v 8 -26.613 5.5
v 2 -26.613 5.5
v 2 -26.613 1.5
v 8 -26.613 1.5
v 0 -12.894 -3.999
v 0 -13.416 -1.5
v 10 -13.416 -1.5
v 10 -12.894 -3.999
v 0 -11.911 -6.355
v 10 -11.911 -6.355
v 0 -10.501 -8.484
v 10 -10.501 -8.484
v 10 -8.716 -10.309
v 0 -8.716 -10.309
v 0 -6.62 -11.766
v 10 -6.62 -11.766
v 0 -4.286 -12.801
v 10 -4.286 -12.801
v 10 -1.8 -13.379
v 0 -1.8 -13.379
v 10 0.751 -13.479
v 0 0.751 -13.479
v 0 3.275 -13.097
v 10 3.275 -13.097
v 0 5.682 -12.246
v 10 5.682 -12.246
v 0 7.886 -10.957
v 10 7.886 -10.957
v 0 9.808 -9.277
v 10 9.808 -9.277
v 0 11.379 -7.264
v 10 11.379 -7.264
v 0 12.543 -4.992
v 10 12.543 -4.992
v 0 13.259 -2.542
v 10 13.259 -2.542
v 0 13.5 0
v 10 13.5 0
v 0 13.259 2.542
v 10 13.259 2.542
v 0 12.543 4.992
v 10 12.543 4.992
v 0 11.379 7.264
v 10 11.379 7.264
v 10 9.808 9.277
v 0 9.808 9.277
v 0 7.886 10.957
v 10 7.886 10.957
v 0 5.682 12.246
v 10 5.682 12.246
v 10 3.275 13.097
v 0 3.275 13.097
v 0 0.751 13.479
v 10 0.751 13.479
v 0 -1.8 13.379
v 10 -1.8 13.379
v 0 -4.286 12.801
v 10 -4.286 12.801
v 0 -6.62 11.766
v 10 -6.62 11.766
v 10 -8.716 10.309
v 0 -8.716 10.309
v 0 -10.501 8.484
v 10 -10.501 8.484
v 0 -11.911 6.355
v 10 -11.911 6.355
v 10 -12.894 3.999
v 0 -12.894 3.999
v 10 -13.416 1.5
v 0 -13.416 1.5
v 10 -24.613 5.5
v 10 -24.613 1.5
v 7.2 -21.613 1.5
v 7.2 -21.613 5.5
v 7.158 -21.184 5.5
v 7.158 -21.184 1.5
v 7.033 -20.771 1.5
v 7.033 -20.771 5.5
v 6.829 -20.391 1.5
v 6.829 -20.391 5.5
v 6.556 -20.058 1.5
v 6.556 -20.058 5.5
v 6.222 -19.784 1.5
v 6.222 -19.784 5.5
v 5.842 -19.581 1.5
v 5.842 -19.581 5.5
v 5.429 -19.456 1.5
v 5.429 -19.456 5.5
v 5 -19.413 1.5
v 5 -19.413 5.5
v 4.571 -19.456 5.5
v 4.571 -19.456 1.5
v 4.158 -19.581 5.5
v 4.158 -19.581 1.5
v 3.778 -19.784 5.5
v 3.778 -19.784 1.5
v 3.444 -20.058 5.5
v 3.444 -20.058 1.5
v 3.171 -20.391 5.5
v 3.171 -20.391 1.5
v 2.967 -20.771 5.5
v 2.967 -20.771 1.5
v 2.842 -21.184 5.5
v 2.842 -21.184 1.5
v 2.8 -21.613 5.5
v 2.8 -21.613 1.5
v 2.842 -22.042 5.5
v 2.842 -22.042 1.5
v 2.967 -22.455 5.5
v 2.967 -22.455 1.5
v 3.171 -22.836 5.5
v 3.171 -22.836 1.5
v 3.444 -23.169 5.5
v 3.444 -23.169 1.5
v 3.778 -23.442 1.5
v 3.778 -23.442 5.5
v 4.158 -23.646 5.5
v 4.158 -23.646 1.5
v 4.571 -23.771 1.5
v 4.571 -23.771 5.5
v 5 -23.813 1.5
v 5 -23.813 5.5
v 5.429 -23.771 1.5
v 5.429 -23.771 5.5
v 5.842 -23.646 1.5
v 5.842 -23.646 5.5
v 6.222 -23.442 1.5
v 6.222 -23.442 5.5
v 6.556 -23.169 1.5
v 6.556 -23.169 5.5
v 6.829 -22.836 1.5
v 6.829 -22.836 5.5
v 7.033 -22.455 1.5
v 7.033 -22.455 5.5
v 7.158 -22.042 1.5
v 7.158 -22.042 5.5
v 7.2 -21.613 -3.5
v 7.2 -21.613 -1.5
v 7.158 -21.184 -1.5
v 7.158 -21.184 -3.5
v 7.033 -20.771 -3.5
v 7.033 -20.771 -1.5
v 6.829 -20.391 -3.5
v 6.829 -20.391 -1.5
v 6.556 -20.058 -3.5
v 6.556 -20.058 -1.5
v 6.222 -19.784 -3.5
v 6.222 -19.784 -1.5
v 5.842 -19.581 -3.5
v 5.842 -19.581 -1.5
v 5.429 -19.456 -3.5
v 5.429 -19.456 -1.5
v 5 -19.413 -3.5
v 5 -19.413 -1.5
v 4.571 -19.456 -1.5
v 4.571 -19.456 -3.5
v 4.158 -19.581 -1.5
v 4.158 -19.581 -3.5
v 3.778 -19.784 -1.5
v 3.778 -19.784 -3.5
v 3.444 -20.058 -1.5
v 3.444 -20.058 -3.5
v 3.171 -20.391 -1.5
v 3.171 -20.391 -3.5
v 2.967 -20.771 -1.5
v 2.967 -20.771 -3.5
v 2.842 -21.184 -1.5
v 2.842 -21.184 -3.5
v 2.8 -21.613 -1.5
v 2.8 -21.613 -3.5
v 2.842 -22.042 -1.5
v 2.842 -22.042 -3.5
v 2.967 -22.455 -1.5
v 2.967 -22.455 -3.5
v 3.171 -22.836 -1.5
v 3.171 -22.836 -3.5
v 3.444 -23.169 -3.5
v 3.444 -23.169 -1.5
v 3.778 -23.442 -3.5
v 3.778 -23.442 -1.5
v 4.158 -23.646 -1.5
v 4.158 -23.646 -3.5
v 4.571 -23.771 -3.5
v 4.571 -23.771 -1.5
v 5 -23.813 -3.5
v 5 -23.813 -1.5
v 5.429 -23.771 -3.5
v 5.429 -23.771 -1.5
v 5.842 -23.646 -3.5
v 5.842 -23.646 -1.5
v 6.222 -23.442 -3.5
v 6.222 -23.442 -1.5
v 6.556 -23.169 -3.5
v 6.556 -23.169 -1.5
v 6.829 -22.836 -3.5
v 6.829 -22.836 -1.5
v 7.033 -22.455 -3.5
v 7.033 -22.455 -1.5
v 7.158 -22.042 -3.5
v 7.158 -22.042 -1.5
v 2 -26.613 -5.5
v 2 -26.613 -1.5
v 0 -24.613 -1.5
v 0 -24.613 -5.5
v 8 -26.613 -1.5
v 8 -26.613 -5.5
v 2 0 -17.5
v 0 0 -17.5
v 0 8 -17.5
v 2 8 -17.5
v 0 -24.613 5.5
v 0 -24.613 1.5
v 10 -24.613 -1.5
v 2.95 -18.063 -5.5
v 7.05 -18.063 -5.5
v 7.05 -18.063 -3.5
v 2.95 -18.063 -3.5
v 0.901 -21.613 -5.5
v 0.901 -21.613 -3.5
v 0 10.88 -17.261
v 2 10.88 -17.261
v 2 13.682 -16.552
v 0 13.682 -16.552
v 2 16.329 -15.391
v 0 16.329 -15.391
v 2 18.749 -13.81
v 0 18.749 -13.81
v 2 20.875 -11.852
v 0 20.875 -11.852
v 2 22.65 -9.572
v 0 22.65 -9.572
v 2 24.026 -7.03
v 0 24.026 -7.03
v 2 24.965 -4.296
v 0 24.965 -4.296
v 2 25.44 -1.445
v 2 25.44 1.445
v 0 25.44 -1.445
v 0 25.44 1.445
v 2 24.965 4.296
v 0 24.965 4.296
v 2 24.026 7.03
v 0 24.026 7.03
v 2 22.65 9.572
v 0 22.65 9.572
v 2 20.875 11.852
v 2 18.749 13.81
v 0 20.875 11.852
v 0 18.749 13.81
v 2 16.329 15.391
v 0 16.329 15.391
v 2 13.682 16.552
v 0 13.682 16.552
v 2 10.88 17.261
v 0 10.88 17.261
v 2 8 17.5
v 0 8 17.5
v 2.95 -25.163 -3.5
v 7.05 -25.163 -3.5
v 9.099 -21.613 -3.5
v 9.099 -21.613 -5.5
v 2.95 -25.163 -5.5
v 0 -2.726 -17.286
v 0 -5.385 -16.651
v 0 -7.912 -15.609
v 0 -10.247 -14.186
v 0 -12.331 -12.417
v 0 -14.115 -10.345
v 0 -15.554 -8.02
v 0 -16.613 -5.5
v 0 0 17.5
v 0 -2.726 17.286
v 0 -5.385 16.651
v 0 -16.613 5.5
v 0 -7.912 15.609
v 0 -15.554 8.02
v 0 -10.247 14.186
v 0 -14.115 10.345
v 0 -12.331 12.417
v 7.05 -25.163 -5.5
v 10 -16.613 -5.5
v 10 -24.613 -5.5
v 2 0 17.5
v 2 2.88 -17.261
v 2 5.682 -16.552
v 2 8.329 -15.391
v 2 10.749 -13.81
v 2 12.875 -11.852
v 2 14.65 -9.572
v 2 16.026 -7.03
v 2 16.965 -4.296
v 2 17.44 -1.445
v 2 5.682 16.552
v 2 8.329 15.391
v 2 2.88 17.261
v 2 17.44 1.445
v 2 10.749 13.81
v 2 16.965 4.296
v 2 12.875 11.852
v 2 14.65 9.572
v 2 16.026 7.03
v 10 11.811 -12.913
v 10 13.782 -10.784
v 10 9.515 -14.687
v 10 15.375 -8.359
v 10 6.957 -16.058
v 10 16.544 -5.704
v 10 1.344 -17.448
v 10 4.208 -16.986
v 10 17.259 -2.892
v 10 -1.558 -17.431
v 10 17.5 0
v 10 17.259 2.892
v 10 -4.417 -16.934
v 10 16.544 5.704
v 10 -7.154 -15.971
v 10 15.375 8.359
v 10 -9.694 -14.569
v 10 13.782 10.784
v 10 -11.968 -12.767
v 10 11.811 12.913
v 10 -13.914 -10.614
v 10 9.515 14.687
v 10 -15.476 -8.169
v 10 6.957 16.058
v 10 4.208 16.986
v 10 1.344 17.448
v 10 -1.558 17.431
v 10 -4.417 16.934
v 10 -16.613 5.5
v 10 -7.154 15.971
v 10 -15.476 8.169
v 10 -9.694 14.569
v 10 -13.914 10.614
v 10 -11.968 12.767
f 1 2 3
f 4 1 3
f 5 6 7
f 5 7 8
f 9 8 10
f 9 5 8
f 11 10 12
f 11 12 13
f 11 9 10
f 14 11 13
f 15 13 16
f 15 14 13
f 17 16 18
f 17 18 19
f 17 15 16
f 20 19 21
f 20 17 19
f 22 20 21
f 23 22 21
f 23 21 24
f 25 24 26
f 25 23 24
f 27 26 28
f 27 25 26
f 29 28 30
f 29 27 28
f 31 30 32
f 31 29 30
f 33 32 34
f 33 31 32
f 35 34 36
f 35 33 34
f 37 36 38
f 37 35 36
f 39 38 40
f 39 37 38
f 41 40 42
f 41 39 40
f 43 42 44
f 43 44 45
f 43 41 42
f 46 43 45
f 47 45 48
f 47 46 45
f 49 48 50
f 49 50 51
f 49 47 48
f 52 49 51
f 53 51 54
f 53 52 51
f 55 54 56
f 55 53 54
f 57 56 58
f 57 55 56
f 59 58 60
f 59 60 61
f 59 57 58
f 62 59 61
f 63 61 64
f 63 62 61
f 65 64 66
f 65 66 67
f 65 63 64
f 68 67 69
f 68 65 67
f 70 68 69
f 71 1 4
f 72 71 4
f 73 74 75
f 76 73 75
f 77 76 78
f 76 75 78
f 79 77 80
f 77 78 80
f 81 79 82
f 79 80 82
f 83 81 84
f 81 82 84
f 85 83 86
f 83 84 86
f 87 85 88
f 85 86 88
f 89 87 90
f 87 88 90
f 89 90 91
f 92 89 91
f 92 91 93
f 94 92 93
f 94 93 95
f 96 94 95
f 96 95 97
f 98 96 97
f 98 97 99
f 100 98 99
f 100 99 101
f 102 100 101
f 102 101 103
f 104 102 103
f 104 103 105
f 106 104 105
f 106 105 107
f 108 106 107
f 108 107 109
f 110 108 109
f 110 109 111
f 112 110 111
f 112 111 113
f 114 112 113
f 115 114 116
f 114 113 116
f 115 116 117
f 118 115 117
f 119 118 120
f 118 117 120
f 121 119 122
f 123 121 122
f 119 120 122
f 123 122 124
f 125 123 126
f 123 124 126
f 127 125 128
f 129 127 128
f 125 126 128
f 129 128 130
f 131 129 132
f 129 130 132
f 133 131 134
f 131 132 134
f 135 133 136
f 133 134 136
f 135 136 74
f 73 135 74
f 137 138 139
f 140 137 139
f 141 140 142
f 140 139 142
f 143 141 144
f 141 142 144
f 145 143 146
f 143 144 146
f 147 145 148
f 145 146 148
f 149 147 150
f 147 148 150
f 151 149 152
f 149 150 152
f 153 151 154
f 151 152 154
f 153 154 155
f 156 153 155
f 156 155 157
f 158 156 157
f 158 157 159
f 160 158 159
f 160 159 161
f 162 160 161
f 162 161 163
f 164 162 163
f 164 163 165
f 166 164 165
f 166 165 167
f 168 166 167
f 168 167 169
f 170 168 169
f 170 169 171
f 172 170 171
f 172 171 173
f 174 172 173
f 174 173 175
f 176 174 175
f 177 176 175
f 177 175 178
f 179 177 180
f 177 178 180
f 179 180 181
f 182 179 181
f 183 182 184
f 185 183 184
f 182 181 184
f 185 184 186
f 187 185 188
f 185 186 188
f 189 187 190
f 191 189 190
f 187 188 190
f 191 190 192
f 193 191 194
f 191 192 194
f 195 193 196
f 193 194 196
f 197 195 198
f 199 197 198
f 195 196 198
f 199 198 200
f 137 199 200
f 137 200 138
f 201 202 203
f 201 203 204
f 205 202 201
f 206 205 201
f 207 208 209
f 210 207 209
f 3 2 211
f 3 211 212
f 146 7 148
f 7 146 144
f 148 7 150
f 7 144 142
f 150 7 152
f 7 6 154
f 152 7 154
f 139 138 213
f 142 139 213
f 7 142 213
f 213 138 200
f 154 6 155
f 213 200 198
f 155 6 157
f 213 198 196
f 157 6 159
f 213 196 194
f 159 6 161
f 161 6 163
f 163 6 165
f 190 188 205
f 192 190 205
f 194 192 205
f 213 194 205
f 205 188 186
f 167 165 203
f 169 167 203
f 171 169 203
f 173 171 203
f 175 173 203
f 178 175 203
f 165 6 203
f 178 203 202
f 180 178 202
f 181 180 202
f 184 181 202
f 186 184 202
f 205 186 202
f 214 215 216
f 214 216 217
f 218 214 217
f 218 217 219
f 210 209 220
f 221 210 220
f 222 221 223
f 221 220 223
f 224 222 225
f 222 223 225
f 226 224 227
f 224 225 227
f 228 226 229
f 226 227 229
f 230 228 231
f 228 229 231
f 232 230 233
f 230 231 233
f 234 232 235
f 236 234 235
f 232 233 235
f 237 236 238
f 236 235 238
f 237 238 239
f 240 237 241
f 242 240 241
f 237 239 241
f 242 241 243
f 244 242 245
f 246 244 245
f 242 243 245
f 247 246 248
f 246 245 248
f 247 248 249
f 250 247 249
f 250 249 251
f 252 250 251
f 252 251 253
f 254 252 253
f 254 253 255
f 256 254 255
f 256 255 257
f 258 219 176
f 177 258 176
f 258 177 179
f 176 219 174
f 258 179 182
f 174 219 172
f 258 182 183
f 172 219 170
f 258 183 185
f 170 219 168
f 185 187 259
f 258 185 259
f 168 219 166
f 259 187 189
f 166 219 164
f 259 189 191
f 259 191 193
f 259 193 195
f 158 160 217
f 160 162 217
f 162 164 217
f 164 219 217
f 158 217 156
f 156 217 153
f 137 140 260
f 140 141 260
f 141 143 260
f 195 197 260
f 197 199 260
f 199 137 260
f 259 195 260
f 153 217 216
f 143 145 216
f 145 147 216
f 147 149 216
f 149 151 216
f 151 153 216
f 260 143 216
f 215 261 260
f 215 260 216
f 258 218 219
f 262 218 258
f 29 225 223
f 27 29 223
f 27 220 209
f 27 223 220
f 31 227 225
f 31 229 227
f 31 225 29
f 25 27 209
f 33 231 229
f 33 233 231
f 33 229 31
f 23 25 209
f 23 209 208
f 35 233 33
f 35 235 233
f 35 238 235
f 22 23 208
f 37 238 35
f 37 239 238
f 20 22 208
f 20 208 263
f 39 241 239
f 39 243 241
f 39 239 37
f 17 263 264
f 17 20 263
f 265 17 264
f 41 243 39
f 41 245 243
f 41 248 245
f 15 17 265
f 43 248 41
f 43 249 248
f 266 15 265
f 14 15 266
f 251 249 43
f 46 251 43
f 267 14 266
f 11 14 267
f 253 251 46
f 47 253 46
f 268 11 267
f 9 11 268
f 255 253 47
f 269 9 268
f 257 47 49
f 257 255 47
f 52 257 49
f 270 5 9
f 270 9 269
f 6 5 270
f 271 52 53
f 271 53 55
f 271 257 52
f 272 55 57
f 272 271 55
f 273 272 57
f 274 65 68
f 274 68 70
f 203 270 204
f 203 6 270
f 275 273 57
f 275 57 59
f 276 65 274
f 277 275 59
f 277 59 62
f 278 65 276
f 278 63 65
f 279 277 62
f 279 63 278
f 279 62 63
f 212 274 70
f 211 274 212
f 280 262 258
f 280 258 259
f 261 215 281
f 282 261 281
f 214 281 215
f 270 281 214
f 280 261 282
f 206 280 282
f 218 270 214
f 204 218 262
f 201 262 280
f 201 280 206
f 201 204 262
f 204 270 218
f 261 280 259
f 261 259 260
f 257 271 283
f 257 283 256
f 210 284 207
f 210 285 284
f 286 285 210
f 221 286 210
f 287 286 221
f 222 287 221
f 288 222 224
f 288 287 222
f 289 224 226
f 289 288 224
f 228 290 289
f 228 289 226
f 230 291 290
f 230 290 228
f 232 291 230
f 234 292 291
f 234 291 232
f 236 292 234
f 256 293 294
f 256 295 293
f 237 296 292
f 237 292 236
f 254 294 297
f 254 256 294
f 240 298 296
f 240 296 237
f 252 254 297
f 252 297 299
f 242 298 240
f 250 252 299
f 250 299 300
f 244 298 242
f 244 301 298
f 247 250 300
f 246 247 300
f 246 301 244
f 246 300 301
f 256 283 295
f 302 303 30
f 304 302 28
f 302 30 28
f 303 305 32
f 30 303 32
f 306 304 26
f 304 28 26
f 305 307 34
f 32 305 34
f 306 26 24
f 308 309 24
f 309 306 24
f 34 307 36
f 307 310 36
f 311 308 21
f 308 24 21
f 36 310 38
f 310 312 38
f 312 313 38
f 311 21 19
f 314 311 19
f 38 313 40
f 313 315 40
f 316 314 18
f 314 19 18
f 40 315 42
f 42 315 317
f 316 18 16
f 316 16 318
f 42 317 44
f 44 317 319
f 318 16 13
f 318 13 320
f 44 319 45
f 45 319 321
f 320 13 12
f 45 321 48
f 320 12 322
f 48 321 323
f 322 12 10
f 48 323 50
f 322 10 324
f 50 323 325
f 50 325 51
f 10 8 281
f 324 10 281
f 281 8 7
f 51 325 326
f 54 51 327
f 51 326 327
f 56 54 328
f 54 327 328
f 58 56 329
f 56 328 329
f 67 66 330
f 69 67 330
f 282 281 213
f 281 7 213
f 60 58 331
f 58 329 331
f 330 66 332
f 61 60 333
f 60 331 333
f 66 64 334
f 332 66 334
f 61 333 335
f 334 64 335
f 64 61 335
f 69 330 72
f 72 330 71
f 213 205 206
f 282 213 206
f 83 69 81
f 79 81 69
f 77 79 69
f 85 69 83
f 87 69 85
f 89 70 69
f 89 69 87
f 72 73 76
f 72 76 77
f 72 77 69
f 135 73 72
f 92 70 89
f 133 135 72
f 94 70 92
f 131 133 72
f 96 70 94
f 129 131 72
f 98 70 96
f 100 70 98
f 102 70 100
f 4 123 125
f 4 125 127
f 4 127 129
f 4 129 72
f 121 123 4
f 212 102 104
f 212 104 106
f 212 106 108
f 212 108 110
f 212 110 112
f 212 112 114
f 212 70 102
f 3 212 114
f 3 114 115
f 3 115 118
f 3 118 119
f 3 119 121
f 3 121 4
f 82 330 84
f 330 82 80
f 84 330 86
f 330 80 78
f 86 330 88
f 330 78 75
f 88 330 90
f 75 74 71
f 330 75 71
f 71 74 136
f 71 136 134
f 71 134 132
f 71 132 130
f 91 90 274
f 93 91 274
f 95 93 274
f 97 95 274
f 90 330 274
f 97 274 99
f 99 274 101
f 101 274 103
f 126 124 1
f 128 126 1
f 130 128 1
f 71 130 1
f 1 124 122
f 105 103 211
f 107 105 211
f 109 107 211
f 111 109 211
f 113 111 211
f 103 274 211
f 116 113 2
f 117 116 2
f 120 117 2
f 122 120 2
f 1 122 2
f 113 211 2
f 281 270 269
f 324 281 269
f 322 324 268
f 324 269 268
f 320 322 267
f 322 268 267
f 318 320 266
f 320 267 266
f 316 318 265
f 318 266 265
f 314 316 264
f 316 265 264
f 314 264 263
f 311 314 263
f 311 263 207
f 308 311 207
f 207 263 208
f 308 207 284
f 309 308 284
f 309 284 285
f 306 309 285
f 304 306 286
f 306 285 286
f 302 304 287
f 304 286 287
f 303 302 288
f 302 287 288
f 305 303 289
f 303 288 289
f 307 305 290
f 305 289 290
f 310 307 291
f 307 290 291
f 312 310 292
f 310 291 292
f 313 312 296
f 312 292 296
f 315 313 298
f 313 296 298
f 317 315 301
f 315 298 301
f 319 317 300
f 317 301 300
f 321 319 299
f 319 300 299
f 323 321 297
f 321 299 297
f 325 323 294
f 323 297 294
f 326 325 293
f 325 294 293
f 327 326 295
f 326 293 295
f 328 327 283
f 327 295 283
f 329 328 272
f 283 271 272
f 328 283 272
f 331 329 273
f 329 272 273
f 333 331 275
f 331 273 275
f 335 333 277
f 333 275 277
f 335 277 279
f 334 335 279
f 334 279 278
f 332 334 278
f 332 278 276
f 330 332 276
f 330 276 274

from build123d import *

# Parameters (mm, degrees)
PAD010_DEPTH    = 10
POCKET004_DEPTH = 2
SKETCH021_R     = 2.2
POCKET005_DEPTH = 23.001
CHAMFER004_SIZE = 2
PAD016_DEPTH    = 2


with BuildPart() as part:
    # Sketch019 → Pad010 (new body)
    with BuildSketch(Plane.YZ):
        with BuildLine():
            ThreePointArc((-13.416408, -1.5), (13.5, 0), (-13.416408, 1.5))
            Line((-13.416408, 1.5), (-26.613248, 1.5))
            Line((-26.613248, 5.5), (-26.613248, 1.5))
            Line((-16.613248, 5.5), (-26.613248, 5.5))
            ThreePointArc((-16.613248, -5.5), (17.5, 0), (-16.613248, 5.5))
            Line((-16.613248, -5.5), (-26.613248, -5.5))
            Line((-26.613248, -1.5), (-26.613248, -5.5))
            Line((-13.416408, -1.5), (-26.613248, -1.5))
        make_face()
    extrude(amount=PAD010_DEPTH)

    # Sketch020 (on DatumPlane) → Pocket004 (cut)
    with BuildSketch(Plane.XY.offset(-5.5)):
        Polygon((7.049593, -25.163248), (9.099187, -21.613248), (7.049593, -18.063248), (2.950407, -18.063248), (0.900813, -21.613248), (2.950407, -25.163248), align=None)
    extrude(amount=POCKET004_DEPTH, mode=Mode.SUBTRACT)

    # Sketch021 (on DatumPlane) → Pocket005 (cut, through all)
    with BuildSketch(Plane.XY.offset(5.5)):
        with Locations((5, -21.613248)):
            Circle(SKETCH021_R)
    extrude(amount=-POCKET005_DEPTH, mode=Mode.SUBTRACT)

    # Chamfer004
    chamfer004_edges = [part.edges().sort_by_distance(p)[0] for p in [
        (10, -26.613248, 3.5),
        (10, -26.613248, -3.5),
        (0, -26.613248, 3.5),
        (0, -26.613248, -3.5),
    ]]
    chamfer(chamfer004_edges, length=CHAMFER004_SIZE)

    # Sketch028 → Pad016 (join)
    with BuildSketch(Plane.YZ):
        with BuildLine():
            ThreePointArc((8, -17.5), (25.5, 0), (8, 17.5))
            Line((0, 17.5), (8, 17.5))
            ThreePointArc((0, -17.5), (17.5, 0), (0, 17.5))
            Line((0, -17.5), (8, -17.5))
        make_face()
    extrude(amount=PAD016_DEPTH)


solid = part.part
